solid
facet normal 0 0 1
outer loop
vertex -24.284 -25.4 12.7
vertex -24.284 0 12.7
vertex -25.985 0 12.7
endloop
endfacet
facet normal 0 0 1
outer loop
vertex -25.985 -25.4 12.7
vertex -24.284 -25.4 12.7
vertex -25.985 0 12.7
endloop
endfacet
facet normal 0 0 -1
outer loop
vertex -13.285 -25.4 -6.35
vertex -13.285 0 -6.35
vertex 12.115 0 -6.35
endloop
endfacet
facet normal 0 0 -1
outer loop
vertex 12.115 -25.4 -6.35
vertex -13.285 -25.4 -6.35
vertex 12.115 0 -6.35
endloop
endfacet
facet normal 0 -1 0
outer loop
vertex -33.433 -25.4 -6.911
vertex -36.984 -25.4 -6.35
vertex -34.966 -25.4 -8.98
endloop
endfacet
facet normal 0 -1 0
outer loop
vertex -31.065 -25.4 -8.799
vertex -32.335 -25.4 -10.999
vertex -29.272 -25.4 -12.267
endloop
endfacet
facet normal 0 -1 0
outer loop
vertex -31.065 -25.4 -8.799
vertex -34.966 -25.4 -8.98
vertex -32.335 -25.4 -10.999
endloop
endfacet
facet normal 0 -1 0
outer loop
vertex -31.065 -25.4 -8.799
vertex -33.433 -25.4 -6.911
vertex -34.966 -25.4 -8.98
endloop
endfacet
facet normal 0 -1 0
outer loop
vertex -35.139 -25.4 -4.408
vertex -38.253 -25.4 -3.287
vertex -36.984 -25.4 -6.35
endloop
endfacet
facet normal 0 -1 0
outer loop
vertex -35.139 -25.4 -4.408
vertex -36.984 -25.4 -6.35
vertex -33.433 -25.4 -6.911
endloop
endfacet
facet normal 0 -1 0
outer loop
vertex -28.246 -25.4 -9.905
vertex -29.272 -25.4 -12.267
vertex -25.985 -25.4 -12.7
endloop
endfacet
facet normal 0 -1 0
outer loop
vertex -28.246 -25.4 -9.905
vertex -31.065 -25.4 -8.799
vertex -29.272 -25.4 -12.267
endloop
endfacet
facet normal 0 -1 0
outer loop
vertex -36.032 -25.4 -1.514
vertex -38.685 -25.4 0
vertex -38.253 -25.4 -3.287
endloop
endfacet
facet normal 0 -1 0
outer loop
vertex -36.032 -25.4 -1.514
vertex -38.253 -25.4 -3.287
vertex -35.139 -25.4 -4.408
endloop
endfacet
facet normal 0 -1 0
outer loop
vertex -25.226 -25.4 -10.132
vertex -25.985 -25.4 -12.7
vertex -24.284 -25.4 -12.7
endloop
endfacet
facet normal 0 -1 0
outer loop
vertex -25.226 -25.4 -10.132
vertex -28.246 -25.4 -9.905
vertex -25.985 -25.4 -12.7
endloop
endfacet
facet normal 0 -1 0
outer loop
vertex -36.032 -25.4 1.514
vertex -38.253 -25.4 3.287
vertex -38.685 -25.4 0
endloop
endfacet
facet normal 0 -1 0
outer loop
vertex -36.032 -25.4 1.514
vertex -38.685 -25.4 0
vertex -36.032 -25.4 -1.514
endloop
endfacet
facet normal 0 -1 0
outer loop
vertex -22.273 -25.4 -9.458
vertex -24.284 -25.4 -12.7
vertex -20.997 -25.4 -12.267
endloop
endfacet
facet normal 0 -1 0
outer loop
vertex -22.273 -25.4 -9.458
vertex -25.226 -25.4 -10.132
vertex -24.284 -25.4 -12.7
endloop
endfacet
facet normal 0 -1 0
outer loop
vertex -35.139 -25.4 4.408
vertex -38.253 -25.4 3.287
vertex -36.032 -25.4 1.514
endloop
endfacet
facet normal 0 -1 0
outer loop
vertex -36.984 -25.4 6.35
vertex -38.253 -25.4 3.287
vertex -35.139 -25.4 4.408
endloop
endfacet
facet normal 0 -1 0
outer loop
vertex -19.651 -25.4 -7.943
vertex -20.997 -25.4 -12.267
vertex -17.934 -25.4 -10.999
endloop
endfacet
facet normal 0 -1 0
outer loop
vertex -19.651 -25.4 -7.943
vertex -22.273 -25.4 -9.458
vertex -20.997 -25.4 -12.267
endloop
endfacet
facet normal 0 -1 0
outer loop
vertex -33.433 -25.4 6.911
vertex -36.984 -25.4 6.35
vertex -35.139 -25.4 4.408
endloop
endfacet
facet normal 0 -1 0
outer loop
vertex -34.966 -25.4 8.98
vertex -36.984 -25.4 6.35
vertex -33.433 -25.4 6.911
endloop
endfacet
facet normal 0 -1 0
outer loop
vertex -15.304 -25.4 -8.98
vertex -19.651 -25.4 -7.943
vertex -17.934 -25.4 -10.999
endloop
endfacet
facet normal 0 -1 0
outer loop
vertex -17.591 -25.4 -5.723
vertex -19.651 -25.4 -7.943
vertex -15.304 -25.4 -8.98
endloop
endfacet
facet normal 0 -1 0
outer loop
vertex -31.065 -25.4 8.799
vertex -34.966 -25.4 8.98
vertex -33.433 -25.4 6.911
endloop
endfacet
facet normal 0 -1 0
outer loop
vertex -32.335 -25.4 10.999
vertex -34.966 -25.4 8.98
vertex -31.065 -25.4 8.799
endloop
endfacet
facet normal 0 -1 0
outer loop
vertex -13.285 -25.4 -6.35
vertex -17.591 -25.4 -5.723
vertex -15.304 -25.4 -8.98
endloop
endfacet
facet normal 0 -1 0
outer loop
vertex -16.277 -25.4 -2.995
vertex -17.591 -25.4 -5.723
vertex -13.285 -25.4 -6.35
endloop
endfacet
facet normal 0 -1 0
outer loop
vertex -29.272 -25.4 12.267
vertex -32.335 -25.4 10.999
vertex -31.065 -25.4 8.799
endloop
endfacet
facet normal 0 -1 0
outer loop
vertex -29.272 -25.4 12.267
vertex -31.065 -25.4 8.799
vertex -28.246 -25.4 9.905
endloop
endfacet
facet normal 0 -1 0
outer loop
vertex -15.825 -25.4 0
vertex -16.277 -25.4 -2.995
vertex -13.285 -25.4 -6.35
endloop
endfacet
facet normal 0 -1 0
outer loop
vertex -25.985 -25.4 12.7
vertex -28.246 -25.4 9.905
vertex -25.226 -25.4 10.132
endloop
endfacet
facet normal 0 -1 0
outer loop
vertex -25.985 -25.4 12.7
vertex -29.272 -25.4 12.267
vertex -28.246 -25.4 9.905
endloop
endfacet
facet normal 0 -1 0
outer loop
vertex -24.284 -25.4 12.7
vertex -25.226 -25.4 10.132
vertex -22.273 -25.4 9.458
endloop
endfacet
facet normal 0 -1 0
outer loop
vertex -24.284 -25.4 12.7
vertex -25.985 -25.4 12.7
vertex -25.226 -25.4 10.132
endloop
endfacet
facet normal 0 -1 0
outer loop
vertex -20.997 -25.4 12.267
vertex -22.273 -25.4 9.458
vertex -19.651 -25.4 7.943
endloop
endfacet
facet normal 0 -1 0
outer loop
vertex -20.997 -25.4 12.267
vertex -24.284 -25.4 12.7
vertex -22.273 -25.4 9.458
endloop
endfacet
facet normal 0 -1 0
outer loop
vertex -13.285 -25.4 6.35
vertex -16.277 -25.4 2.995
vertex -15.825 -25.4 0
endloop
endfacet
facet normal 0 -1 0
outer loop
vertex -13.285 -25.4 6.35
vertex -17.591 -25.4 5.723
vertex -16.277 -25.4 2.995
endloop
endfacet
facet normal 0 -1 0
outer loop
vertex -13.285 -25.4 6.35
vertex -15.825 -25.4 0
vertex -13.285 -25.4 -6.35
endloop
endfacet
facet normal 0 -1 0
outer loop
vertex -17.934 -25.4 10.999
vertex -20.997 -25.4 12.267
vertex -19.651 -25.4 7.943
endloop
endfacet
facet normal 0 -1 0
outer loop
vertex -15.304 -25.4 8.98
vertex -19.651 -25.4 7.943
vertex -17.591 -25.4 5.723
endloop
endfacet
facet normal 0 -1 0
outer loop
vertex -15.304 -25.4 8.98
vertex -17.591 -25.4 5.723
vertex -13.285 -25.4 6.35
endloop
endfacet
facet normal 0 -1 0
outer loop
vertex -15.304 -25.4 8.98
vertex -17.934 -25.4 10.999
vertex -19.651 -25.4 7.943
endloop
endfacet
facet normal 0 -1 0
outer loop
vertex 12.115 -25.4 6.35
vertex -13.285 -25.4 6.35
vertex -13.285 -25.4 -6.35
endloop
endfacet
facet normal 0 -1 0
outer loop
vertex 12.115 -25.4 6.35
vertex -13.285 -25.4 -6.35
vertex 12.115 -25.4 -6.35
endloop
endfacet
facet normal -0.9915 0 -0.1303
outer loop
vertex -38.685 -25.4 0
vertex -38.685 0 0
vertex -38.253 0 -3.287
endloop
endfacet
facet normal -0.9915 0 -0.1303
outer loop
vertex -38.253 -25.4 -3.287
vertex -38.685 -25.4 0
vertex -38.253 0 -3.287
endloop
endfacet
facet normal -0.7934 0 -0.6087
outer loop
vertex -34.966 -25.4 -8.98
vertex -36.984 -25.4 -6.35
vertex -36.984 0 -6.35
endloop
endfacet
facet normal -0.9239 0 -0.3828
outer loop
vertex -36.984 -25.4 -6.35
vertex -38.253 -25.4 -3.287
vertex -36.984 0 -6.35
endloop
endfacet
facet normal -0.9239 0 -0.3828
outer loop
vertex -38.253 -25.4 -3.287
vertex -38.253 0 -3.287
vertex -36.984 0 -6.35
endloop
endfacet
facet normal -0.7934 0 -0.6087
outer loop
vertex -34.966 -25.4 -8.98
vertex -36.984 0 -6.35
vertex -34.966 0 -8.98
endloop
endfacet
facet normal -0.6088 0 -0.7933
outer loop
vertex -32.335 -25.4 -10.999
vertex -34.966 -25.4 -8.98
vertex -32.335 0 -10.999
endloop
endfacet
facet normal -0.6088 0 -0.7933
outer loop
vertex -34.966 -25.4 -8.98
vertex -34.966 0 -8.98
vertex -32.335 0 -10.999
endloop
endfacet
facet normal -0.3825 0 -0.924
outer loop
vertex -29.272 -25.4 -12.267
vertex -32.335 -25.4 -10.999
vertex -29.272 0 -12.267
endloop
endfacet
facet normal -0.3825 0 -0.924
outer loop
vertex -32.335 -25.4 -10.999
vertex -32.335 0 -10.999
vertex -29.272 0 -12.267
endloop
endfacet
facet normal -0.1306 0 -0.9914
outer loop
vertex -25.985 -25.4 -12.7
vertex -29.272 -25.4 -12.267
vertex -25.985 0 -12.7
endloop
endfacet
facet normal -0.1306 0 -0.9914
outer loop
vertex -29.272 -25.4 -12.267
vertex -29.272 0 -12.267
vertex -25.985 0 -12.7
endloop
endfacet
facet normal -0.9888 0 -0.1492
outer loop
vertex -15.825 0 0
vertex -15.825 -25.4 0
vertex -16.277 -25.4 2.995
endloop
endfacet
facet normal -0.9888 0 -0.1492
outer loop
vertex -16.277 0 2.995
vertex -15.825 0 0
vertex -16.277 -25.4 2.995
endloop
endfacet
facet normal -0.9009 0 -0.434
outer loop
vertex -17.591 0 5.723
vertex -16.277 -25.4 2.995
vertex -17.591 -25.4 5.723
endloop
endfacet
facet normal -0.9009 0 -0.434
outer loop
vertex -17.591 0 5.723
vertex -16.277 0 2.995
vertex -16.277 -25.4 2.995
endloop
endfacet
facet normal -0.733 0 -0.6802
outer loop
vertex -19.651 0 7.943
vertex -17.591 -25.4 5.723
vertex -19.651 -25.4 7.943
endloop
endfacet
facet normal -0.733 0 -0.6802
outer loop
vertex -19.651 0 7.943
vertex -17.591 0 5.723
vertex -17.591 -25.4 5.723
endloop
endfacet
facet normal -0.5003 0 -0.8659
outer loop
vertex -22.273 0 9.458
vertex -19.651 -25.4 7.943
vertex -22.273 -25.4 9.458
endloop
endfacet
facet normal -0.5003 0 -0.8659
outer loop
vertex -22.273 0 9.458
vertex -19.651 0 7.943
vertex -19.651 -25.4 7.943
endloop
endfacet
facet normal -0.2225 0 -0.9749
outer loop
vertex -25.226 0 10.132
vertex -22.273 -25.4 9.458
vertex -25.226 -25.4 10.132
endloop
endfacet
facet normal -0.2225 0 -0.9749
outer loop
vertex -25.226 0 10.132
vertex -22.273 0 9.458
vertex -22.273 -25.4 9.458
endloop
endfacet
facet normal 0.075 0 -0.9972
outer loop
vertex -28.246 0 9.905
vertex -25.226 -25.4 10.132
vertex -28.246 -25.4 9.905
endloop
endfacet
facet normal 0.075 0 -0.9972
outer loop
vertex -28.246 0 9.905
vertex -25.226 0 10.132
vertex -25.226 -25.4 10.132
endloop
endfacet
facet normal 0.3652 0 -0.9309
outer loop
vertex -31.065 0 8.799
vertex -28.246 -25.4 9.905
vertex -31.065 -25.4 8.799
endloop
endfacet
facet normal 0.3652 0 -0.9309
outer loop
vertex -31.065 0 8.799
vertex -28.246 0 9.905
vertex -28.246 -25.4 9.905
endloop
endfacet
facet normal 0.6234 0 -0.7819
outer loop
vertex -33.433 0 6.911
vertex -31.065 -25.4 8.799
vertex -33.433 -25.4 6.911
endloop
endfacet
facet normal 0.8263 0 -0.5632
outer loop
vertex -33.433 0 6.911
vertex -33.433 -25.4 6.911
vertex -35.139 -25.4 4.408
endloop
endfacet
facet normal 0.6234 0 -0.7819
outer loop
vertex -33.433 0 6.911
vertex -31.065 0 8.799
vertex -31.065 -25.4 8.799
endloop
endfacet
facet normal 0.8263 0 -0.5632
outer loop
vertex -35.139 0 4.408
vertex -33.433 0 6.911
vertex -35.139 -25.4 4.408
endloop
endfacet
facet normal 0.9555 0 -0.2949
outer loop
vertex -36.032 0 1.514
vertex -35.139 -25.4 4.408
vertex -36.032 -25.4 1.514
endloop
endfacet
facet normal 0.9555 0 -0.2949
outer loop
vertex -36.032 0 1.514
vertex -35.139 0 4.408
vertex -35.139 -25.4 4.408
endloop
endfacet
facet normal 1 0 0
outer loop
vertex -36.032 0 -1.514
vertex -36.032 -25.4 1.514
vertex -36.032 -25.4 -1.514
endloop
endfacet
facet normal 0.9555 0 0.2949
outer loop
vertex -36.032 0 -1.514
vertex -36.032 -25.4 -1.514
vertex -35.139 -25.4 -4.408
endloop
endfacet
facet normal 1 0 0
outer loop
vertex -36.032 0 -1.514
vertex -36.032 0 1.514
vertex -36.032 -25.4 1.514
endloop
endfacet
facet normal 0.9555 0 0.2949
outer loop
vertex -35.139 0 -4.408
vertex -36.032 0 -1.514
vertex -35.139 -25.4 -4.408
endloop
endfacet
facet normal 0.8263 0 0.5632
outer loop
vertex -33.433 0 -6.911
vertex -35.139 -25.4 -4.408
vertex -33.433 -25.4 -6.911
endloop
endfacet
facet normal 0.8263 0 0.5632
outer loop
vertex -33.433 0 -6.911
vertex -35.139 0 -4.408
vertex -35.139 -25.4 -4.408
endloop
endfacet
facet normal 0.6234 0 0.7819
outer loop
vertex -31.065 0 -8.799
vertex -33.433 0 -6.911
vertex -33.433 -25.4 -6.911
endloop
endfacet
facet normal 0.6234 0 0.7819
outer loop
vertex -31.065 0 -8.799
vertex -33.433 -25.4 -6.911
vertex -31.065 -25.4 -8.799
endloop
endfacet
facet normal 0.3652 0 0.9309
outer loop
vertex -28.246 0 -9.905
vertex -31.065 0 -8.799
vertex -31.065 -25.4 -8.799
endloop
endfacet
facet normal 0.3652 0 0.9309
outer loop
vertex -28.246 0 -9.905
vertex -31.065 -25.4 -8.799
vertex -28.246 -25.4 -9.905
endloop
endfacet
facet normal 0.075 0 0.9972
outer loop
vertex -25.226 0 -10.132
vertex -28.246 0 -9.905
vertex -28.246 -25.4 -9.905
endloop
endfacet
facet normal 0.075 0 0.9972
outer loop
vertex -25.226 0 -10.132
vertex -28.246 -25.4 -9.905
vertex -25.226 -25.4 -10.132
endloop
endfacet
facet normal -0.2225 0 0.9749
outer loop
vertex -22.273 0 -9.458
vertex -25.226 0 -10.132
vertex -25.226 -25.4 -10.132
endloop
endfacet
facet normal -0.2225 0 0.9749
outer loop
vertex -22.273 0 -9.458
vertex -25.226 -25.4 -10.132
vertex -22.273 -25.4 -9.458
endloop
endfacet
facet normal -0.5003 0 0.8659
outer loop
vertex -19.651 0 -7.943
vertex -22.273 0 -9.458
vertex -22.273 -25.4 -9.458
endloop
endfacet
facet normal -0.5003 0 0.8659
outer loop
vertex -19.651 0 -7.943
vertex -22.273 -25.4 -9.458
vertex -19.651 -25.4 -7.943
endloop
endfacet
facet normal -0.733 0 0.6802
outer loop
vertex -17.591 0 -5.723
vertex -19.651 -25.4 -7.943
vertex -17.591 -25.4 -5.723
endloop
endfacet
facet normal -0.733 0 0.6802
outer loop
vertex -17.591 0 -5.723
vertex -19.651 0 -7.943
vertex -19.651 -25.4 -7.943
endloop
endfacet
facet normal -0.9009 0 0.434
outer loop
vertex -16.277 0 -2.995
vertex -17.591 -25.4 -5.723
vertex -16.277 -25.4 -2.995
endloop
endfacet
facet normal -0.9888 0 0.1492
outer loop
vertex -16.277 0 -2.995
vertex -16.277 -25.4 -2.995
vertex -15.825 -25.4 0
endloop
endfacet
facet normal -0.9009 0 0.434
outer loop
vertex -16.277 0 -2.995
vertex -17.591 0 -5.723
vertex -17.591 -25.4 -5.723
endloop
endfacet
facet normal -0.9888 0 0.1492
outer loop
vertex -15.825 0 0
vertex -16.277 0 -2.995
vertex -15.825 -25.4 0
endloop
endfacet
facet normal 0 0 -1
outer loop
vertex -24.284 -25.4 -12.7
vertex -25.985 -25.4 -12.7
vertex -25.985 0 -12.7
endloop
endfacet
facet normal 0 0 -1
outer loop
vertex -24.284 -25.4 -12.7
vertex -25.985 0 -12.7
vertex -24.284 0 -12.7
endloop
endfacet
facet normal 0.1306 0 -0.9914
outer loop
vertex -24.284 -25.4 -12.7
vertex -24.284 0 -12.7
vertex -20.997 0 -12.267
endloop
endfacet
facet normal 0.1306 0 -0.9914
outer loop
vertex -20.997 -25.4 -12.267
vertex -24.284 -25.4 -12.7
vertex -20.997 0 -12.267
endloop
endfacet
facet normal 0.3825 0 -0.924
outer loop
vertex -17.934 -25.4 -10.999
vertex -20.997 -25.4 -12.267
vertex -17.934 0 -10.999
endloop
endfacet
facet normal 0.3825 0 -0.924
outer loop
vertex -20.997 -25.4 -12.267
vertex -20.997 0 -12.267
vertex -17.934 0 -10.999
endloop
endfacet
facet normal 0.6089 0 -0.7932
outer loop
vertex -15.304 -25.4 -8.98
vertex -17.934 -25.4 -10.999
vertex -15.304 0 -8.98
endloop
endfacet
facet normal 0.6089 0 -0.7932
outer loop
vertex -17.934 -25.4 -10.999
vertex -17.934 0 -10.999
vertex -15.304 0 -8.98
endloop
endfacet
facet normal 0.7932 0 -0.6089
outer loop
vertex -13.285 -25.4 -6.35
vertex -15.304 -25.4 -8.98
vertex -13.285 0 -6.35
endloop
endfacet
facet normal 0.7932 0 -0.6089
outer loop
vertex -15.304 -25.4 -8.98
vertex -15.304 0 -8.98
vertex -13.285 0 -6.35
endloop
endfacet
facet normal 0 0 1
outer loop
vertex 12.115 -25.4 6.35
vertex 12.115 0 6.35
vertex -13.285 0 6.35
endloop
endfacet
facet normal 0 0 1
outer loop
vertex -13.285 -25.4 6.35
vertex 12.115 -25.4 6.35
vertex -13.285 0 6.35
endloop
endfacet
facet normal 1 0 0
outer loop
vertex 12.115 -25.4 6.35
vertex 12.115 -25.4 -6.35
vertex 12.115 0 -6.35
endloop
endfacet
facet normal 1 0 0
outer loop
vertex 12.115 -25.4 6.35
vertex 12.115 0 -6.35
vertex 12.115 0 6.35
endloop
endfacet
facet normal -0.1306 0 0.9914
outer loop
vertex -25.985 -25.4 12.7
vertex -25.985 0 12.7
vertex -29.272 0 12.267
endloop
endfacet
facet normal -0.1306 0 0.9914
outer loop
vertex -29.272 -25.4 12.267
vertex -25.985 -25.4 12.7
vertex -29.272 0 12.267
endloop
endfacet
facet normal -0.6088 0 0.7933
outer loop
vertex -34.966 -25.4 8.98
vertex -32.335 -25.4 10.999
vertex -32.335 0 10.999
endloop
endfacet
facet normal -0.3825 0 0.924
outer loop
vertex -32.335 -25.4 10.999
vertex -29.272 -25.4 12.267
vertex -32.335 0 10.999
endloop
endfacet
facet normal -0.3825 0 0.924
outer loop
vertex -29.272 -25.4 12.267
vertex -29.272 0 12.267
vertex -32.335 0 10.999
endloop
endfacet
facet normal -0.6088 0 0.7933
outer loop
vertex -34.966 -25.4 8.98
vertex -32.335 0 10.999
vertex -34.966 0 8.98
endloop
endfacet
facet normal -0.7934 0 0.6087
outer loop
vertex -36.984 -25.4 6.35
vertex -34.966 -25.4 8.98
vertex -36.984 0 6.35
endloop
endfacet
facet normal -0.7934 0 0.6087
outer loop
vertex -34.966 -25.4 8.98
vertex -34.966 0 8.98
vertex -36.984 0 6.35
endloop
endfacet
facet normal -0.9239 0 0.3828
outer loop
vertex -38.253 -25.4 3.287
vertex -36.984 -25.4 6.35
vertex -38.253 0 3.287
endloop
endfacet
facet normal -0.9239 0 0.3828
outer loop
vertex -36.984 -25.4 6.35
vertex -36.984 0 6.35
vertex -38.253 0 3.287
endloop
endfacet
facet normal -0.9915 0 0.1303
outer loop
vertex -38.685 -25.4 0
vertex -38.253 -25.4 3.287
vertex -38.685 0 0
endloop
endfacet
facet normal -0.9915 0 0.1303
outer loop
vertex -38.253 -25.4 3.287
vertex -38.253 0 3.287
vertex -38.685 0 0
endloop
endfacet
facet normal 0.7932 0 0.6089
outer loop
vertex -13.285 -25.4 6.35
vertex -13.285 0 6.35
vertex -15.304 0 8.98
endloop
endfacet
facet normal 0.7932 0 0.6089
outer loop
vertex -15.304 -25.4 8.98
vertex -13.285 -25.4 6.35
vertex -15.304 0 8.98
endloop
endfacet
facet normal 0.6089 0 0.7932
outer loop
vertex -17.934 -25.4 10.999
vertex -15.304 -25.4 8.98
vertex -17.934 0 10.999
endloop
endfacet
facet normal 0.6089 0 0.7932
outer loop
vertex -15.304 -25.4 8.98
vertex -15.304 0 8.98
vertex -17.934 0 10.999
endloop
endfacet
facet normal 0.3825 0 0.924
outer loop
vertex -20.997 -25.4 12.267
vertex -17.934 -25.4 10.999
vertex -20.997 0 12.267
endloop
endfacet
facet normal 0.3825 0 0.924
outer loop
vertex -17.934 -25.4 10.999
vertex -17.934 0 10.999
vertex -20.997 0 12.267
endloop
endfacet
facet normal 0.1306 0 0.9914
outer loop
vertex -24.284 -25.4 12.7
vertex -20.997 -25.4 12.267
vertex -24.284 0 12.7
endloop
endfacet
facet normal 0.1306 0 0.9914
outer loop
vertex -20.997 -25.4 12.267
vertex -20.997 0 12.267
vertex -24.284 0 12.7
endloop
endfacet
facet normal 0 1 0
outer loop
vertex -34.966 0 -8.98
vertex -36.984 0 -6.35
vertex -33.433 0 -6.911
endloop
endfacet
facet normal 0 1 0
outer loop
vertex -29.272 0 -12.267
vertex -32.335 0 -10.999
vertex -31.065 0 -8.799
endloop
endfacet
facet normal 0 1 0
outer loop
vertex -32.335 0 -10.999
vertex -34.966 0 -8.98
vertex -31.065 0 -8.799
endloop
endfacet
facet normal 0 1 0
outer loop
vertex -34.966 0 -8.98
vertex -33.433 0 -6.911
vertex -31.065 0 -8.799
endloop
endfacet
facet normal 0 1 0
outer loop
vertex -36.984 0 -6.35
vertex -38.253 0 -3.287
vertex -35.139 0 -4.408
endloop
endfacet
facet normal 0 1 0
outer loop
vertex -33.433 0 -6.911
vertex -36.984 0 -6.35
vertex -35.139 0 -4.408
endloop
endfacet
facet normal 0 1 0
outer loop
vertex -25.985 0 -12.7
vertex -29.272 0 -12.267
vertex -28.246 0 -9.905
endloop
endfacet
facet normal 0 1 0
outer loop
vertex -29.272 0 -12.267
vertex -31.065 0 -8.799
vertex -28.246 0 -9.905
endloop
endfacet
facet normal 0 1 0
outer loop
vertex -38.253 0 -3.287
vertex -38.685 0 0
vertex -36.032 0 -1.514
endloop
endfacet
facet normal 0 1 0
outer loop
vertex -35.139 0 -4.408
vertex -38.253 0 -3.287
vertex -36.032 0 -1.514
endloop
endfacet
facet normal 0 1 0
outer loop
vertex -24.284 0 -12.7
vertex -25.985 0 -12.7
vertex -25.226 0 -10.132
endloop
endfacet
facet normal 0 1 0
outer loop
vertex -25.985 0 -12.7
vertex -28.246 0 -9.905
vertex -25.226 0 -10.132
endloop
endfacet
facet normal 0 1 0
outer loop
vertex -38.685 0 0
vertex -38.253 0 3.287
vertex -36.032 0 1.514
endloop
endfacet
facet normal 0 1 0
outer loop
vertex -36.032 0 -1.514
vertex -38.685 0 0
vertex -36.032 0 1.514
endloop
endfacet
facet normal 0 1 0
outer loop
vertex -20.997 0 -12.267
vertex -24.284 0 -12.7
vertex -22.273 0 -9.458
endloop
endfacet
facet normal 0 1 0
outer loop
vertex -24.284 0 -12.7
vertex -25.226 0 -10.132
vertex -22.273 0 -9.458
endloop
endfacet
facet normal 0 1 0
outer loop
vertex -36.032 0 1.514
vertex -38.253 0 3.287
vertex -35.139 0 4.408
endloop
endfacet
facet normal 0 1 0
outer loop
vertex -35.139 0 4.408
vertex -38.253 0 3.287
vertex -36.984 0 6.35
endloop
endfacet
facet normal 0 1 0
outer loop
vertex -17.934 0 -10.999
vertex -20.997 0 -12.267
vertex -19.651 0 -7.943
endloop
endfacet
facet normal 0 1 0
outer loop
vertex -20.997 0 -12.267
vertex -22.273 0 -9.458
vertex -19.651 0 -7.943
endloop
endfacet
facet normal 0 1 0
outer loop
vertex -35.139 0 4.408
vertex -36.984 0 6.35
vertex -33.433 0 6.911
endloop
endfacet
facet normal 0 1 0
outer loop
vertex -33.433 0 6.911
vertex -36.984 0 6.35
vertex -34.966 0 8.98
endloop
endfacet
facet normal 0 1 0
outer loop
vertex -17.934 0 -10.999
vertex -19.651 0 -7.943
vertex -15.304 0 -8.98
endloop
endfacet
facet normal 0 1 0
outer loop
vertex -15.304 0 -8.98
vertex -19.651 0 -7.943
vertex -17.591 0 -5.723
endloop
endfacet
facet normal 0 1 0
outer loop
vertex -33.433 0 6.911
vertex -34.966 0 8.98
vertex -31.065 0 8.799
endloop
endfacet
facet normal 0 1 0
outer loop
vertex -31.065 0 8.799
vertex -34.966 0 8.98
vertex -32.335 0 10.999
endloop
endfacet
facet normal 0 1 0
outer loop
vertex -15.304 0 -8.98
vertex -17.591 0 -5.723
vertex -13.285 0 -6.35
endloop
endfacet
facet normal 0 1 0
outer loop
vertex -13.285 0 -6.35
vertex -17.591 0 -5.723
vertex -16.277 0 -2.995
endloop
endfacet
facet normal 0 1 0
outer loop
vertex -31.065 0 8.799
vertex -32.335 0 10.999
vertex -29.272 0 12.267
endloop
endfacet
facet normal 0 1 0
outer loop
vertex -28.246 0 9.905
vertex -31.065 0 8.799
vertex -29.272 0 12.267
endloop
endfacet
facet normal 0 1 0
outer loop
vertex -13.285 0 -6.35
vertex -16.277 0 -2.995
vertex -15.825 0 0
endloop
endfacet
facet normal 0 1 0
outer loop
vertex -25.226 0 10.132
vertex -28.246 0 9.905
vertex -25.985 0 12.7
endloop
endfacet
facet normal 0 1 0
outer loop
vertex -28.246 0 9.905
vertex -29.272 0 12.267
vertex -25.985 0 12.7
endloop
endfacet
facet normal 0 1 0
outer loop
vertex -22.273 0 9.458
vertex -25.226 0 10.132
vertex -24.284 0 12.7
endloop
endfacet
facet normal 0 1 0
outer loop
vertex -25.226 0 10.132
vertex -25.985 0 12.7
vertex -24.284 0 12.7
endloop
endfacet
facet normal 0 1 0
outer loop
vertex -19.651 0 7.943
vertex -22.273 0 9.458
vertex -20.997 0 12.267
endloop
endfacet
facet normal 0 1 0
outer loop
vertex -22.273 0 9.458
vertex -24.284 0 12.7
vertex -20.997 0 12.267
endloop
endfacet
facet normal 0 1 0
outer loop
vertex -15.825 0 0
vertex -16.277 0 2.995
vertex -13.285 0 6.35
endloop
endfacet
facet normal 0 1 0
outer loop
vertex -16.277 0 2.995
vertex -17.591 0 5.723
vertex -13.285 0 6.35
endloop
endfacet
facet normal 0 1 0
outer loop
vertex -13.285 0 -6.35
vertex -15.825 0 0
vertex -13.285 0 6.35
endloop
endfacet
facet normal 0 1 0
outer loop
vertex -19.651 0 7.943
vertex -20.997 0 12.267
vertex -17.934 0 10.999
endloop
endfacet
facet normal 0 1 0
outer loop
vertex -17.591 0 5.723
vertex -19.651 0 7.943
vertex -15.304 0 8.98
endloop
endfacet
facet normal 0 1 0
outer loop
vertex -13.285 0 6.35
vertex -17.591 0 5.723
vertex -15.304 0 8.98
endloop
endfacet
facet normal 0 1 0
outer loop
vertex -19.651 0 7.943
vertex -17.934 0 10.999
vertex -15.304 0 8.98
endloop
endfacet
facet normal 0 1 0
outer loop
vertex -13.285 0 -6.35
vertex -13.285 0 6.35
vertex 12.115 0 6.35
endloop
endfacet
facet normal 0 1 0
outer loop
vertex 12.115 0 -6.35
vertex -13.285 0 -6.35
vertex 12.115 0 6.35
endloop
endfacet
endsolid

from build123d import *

# Parameters (mm, degrees)
F0_R        = 10.16
F1_DEPTH    = 25.4
F2_T1_DEPTH = 80.3926131403
F2_T3_DEPTH = 88.9


# Not quite as in the source:
# - a fillet or chamfer that OpenCascade refuses, or shapes differently, is made with other operations: its cross-section is extruded or revolved along the edge and cut away or added


with BuildPart() as f1:
    # F0 (on Front) → F1 (new body)
    with BuildSketch(Plane.XZ):
        Polygon((-13.2853005409, 12.7), (-38.6853005409, 12.7), (-38.6853005409, -12.7), (-13.2853005409, -12.7), (-13.2853005409, -6.35), (12.1146994591, -6.35), (12.1146994591, 6.35), (-13.2853005409, 6.35), align=None)
        with Locations((-25.9853005409, 0)):
            Circle(F0_R, mode=Mode.SUBTRACT)
    extrude(amount=F1_DEPTH)

    # F2: fillet of radius 12.7 on 4 edges, made by hand

    # F2_s2 → F2_t1 (cut)
    with BuildSketch(Plane.XZ.offset(-27.4963065702)):
        with BuildLine():
            ThreePointArc((-13.2853005409, 6.35), (-17.933823169, 10.9985226281), (-24.283823169, 12.7))
            Line((-24.283823169, 12.7), (-13.2853005409, 12.7))
            Line((-13.2853005409, 12.7), (-13.2853005409, 6.35))
        make_face()
        with BuildLine():
            ThreePointArc((-24.283823169, -12.7), (-17.933823169, -10.9985226281), (-13.2853005409, -6.35))
            Line((-13.2853005409, -6.35), (-13.2853005409, -12.7))
            Line((-13.2853005409, -12.7), (-24.283823169, -12.7))
        make_face()
    extrude(amount=F2_T1_DEPTH, mode=Mode.SUBTRACT)

    # F2_s4 → F2_t3 (cut)
    with BuildSketch(Plane.XZ.offset(-31.75)):
        with BuildLine():
            ThreePointArc((-25.9853005409, 12.7), (-34.965556662, 8.9802561211), (-38.6853005409, 0))
            Line((-38.6853005409, 0), (-38.6853005409, 12.7))
            Line((-38.6853005409, 12.7), (-25.9853005409, 12.7))
        make_face()
        with BuildLine():
            ThreePointArc((-38.6853005409, 0), (-34.965556662, -8.9802561211), (-25.9853005409, -12.7))
            Line((-25.9853005409, -12.7), (-38.6853005409, -12.7))
            Line((-38.6853005409, -12.7), (-38.6853005409, 0))
        make_face()
    extrude(amount=F2_T3_DEPTH, mode=Mode.SUBTRACT)


solid = f1.part
